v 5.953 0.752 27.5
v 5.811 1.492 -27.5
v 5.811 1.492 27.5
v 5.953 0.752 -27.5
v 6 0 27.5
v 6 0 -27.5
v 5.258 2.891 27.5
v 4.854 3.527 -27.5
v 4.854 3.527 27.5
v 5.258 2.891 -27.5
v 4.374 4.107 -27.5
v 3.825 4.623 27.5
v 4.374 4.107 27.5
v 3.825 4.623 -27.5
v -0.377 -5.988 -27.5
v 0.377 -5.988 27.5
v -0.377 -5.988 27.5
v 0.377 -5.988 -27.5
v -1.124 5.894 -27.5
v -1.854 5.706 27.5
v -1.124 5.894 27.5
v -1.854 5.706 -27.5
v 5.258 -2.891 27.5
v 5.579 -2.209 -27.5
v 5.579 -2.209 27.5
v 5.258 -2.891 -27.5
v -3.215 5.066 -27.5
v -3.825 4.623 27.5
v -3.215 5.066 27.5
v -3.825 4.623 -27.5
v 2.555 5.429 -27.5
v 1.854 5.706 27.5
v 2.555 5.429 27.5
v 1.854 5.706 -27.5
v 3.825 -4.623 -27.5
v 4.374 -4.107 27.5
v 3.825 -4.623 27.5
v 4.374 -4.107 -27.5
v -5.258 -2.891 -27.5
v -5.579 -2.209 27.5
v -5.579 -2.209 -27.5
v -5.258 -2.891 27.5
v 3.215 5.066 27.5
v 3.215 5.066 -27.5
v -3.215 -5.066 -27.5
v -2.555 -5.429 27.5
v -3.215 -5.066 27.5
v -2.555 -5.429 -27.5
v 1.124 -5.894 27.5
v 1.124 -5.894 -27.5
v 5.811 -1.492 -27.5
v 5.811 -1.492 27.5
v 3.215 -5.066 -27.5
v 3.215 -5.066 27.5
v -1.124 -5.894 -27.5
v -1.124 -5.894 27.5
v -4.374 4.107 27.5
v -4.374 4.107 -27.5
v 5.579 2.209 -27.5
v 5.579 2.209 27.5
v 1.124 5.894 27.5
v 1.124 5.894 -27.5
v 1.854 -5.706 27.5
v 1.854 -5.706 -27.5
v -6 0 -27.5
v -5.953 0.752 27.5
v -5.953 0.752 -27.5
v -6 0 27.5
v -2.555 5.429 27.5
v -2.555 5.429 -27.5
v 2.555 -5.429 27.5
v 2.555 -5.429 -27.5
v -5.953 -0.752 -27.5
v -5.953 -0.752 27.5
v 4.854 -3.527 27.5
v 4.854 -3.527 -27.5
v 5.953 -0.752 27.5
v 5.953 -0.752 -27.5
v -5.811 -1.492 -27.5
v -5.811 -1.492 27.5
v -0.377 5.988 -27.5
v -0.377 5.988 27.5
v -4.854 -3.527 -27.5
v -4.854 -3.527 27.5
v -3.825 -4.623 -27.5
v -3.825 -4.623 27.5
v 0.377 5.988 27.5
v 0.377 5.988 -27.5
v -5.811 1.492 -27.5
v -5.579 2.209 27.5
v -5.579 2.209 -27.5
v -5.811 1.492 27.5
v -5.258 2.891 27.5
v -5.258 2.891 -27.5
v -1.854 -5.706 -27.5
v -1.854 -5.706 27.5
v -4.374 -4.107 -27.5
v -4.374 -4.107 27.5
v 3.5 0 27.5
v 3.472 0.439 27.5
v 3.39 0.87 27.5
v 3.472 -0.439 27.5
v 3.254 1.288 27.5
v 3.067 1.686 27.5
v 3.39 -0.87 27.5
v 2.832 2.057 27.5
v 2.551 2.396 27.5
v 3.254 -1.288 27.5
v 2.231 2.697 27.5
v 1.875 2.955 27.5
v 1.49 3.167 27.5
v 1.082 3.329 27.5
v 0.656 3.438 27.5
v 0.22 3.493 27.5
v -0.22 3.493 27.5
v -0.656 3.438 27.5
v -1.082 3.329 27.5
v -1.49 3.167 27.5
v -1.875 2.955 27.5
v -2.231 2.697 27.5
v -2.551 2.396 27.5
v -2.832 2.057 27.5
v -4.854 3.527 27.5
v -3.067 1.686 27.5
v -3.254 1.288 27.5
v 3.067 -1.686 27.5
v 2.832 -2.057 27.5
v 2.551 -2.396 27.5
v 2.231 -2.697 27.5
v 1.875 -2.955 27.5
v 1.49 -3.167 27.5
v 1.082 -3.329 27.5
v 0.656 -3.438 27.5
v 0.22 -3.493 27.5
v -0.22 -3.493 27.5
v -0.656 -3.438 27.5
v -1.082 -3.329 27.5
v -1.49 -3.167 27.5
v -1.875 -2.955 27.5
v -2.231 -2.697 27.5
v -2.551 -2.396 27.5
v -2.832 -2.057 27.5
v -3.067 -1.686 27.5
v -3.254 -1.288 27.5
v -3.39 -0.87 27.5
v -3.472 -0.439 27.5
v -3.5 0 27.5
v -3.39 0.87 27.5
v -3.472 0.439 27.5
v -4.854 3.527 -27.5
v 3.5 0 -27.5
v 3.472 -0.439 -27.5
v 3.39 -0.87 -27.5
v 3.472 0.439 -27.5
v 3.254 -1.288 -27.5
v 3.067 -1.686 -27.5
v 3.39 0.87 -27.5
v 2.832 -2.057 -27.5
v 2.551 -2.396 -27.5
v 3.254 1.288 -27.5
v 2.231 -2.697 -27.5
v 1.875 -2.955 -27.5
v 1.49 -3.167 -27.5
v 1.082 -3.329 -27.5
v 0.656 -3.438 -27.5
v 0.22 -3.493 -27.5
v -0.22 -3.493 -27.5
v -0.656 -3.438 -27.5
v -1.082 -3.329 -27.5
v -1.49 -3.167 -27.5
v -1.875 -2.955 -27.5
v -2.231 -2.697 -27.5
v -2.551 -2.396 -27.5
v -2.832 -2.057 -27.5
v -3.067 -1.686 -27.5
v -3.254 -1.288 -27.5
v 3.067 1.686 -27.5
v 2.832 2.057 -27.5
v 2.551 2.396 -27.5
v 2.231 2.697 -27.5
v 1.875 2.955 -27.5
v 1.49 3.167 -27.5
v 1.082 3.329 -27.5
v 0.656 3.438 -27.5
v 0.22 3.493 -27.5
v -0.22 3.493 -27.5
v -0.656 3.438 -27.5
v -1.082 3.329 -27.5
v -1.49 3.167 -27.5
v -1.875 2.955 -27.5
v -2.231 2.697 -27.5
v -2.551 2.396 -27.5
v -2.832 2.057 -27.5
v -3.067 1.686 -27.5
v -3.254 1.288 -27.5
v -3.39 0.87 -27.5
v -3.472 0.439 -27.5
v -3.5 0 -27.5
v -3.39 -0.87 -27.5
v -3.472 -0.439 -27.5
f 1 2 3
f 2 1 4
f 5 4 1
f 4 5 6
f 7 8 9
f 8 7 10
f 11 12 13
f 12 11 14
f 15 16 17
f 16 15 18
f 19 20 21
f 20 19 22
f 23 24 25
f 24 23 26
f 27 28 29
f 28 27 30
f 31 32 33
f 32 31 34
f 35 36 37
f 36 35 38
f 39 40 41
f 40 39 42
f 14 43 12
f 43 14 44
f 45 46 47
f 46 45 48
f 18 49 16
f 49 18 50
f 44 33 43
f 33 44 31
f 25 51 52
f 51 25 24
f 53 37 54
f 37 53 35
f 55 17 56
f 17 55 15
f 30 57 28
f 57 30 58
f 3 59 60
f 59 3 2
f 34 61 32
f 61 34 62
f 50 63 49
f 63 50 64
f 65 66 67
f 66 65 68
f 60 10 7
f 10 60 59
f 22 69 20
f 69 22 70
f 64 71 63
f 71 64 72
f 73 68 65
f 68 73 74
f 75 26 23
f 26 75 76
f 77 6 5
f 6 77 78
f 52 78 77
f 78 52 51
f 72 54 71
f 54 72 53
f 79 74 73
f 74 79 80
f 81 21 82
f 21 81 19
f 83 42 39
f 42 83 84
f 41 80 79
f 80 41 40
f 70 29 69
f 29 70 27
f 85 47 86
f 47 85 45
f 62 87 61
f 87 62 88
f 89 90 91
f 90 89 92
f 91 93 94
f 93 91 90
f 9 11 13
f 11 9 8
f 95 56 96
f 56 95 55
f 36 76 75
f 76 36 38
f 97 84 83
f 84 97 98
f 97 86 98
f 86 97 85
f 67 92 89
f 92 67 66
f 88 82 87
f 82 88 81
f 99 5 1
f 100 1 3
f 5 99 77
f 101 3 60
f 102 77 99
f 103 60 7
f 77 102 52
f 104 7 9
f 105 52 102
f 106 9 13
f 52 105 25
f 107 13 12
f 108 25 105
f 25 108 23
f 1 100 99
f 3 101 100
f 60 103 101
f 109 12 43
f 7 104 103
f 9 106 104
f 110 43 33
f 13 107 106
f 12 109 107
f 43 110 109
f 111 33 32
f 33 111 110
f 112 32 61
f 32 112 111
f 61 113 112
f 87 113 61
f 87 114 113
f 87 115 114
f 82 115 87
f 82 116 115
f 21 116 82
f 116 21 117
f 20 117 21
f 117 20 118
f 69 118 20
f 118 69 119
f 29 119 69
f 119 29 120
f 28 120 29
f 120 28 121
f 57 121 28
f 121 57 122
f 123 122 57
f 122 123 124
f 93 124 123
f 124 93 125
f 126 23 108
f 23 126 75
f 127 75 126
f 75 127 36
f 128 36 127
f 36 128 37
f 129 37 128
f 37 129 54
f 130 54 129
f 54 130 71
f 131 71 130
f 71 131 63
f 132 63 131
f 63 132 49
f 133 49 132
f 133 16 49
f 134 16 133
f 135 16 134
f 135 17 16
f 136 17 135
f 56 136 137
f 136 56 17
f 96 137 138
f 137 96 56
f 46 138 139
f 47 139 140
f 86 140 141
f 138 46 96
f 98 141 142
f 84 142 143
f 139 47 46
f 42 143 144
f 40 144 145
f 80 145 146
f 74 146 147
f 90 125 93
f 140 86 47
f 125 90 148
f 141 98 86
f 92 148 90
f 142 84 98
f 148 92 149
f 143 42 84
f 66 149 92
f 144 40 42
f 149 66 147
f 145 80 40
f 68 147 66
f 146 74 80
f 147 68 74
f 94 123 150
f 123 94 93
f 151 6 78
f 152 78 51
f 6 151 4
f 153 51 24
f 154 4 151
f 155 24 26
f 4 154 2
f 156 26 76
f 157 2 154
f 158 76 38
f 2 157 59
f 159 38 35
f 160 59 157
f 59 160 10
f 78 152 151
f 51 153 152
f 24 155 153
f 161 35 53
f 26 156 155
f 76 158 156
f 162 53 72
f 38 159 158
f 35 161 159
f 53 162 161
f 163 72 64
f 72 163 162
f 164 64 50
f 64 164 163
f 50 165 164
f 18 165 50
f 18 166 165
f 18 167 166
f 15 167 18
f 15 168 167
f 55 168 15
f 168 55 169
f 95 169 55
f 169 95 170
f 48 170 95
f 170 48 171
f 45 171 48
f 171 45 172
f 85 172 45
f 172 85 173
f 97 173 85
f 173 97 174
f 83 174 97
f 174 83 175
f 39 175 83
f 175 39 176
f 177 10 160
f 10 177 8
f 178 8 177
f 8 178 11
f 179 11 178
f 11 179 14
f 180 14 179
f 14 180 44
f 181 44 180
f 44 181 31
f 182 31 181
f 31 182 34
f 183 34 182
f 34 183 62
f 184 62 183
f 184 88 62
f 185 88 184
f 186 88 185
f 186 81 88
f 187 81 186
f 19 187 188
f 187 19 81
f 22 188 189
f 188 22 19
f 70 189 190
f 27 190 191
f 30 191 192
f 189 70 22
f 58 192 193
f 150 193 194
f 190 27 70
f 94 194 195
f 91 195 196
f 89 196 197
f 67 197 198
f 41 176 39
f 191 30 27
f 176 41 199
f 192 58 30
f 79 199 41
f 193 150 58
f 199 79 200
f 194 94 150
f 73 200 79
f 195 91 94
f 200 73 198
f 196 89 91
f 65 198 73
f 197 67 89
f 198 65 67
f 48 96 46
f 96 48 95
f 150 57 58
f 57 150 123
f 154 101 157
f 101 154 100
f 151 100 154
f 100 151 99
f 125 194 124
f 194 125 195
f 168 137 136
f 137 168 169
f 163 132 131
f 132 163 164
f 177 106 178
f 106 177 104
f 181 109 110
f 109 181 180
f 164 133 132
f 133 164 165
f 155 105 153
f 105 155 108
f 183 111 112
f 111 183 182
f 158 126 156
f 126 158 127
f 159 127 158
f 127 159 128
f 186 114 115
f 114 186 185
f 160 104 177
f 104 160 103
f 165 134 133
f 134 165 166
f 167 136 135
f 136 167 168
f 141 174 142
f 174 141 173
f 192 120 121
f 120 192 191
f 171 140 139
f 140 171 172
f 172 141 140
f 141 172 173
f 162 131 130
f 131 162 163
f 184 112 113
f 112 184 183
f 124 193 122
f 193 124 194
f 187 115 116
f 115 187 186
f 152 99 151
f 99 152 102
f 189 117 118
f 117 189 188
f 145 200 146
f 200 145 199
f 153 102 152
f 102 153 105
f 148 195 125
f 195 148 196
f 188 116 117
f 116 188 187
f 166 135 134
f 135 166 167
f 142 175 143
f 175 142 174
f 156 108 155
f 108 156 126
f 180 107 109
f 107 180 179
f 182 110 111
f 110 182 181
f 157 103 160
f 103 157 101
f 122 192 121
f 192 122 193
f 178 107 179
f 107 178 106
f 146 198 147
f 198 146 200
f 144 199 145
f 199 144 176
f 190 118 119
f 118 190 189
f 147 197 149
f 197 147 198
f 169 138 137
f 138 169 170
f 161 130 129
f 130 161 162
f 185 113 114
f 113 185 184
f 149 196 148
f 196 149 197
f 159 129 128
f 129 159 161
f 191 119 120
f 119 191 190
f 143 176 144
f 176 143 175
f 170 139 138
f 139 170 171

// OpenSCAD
$fn = 50;


difference() {
	union() {
		translate(v = [0, 0, -27.5000000000]) {
			cylinder(h = 55, r = 6.0000000000);
		}
	}
	union() {
		translate(v = [0, 0, -100.0000000000]) {
			cylinder(h = 200, r = 3.5000000000);
		}
	}
}
